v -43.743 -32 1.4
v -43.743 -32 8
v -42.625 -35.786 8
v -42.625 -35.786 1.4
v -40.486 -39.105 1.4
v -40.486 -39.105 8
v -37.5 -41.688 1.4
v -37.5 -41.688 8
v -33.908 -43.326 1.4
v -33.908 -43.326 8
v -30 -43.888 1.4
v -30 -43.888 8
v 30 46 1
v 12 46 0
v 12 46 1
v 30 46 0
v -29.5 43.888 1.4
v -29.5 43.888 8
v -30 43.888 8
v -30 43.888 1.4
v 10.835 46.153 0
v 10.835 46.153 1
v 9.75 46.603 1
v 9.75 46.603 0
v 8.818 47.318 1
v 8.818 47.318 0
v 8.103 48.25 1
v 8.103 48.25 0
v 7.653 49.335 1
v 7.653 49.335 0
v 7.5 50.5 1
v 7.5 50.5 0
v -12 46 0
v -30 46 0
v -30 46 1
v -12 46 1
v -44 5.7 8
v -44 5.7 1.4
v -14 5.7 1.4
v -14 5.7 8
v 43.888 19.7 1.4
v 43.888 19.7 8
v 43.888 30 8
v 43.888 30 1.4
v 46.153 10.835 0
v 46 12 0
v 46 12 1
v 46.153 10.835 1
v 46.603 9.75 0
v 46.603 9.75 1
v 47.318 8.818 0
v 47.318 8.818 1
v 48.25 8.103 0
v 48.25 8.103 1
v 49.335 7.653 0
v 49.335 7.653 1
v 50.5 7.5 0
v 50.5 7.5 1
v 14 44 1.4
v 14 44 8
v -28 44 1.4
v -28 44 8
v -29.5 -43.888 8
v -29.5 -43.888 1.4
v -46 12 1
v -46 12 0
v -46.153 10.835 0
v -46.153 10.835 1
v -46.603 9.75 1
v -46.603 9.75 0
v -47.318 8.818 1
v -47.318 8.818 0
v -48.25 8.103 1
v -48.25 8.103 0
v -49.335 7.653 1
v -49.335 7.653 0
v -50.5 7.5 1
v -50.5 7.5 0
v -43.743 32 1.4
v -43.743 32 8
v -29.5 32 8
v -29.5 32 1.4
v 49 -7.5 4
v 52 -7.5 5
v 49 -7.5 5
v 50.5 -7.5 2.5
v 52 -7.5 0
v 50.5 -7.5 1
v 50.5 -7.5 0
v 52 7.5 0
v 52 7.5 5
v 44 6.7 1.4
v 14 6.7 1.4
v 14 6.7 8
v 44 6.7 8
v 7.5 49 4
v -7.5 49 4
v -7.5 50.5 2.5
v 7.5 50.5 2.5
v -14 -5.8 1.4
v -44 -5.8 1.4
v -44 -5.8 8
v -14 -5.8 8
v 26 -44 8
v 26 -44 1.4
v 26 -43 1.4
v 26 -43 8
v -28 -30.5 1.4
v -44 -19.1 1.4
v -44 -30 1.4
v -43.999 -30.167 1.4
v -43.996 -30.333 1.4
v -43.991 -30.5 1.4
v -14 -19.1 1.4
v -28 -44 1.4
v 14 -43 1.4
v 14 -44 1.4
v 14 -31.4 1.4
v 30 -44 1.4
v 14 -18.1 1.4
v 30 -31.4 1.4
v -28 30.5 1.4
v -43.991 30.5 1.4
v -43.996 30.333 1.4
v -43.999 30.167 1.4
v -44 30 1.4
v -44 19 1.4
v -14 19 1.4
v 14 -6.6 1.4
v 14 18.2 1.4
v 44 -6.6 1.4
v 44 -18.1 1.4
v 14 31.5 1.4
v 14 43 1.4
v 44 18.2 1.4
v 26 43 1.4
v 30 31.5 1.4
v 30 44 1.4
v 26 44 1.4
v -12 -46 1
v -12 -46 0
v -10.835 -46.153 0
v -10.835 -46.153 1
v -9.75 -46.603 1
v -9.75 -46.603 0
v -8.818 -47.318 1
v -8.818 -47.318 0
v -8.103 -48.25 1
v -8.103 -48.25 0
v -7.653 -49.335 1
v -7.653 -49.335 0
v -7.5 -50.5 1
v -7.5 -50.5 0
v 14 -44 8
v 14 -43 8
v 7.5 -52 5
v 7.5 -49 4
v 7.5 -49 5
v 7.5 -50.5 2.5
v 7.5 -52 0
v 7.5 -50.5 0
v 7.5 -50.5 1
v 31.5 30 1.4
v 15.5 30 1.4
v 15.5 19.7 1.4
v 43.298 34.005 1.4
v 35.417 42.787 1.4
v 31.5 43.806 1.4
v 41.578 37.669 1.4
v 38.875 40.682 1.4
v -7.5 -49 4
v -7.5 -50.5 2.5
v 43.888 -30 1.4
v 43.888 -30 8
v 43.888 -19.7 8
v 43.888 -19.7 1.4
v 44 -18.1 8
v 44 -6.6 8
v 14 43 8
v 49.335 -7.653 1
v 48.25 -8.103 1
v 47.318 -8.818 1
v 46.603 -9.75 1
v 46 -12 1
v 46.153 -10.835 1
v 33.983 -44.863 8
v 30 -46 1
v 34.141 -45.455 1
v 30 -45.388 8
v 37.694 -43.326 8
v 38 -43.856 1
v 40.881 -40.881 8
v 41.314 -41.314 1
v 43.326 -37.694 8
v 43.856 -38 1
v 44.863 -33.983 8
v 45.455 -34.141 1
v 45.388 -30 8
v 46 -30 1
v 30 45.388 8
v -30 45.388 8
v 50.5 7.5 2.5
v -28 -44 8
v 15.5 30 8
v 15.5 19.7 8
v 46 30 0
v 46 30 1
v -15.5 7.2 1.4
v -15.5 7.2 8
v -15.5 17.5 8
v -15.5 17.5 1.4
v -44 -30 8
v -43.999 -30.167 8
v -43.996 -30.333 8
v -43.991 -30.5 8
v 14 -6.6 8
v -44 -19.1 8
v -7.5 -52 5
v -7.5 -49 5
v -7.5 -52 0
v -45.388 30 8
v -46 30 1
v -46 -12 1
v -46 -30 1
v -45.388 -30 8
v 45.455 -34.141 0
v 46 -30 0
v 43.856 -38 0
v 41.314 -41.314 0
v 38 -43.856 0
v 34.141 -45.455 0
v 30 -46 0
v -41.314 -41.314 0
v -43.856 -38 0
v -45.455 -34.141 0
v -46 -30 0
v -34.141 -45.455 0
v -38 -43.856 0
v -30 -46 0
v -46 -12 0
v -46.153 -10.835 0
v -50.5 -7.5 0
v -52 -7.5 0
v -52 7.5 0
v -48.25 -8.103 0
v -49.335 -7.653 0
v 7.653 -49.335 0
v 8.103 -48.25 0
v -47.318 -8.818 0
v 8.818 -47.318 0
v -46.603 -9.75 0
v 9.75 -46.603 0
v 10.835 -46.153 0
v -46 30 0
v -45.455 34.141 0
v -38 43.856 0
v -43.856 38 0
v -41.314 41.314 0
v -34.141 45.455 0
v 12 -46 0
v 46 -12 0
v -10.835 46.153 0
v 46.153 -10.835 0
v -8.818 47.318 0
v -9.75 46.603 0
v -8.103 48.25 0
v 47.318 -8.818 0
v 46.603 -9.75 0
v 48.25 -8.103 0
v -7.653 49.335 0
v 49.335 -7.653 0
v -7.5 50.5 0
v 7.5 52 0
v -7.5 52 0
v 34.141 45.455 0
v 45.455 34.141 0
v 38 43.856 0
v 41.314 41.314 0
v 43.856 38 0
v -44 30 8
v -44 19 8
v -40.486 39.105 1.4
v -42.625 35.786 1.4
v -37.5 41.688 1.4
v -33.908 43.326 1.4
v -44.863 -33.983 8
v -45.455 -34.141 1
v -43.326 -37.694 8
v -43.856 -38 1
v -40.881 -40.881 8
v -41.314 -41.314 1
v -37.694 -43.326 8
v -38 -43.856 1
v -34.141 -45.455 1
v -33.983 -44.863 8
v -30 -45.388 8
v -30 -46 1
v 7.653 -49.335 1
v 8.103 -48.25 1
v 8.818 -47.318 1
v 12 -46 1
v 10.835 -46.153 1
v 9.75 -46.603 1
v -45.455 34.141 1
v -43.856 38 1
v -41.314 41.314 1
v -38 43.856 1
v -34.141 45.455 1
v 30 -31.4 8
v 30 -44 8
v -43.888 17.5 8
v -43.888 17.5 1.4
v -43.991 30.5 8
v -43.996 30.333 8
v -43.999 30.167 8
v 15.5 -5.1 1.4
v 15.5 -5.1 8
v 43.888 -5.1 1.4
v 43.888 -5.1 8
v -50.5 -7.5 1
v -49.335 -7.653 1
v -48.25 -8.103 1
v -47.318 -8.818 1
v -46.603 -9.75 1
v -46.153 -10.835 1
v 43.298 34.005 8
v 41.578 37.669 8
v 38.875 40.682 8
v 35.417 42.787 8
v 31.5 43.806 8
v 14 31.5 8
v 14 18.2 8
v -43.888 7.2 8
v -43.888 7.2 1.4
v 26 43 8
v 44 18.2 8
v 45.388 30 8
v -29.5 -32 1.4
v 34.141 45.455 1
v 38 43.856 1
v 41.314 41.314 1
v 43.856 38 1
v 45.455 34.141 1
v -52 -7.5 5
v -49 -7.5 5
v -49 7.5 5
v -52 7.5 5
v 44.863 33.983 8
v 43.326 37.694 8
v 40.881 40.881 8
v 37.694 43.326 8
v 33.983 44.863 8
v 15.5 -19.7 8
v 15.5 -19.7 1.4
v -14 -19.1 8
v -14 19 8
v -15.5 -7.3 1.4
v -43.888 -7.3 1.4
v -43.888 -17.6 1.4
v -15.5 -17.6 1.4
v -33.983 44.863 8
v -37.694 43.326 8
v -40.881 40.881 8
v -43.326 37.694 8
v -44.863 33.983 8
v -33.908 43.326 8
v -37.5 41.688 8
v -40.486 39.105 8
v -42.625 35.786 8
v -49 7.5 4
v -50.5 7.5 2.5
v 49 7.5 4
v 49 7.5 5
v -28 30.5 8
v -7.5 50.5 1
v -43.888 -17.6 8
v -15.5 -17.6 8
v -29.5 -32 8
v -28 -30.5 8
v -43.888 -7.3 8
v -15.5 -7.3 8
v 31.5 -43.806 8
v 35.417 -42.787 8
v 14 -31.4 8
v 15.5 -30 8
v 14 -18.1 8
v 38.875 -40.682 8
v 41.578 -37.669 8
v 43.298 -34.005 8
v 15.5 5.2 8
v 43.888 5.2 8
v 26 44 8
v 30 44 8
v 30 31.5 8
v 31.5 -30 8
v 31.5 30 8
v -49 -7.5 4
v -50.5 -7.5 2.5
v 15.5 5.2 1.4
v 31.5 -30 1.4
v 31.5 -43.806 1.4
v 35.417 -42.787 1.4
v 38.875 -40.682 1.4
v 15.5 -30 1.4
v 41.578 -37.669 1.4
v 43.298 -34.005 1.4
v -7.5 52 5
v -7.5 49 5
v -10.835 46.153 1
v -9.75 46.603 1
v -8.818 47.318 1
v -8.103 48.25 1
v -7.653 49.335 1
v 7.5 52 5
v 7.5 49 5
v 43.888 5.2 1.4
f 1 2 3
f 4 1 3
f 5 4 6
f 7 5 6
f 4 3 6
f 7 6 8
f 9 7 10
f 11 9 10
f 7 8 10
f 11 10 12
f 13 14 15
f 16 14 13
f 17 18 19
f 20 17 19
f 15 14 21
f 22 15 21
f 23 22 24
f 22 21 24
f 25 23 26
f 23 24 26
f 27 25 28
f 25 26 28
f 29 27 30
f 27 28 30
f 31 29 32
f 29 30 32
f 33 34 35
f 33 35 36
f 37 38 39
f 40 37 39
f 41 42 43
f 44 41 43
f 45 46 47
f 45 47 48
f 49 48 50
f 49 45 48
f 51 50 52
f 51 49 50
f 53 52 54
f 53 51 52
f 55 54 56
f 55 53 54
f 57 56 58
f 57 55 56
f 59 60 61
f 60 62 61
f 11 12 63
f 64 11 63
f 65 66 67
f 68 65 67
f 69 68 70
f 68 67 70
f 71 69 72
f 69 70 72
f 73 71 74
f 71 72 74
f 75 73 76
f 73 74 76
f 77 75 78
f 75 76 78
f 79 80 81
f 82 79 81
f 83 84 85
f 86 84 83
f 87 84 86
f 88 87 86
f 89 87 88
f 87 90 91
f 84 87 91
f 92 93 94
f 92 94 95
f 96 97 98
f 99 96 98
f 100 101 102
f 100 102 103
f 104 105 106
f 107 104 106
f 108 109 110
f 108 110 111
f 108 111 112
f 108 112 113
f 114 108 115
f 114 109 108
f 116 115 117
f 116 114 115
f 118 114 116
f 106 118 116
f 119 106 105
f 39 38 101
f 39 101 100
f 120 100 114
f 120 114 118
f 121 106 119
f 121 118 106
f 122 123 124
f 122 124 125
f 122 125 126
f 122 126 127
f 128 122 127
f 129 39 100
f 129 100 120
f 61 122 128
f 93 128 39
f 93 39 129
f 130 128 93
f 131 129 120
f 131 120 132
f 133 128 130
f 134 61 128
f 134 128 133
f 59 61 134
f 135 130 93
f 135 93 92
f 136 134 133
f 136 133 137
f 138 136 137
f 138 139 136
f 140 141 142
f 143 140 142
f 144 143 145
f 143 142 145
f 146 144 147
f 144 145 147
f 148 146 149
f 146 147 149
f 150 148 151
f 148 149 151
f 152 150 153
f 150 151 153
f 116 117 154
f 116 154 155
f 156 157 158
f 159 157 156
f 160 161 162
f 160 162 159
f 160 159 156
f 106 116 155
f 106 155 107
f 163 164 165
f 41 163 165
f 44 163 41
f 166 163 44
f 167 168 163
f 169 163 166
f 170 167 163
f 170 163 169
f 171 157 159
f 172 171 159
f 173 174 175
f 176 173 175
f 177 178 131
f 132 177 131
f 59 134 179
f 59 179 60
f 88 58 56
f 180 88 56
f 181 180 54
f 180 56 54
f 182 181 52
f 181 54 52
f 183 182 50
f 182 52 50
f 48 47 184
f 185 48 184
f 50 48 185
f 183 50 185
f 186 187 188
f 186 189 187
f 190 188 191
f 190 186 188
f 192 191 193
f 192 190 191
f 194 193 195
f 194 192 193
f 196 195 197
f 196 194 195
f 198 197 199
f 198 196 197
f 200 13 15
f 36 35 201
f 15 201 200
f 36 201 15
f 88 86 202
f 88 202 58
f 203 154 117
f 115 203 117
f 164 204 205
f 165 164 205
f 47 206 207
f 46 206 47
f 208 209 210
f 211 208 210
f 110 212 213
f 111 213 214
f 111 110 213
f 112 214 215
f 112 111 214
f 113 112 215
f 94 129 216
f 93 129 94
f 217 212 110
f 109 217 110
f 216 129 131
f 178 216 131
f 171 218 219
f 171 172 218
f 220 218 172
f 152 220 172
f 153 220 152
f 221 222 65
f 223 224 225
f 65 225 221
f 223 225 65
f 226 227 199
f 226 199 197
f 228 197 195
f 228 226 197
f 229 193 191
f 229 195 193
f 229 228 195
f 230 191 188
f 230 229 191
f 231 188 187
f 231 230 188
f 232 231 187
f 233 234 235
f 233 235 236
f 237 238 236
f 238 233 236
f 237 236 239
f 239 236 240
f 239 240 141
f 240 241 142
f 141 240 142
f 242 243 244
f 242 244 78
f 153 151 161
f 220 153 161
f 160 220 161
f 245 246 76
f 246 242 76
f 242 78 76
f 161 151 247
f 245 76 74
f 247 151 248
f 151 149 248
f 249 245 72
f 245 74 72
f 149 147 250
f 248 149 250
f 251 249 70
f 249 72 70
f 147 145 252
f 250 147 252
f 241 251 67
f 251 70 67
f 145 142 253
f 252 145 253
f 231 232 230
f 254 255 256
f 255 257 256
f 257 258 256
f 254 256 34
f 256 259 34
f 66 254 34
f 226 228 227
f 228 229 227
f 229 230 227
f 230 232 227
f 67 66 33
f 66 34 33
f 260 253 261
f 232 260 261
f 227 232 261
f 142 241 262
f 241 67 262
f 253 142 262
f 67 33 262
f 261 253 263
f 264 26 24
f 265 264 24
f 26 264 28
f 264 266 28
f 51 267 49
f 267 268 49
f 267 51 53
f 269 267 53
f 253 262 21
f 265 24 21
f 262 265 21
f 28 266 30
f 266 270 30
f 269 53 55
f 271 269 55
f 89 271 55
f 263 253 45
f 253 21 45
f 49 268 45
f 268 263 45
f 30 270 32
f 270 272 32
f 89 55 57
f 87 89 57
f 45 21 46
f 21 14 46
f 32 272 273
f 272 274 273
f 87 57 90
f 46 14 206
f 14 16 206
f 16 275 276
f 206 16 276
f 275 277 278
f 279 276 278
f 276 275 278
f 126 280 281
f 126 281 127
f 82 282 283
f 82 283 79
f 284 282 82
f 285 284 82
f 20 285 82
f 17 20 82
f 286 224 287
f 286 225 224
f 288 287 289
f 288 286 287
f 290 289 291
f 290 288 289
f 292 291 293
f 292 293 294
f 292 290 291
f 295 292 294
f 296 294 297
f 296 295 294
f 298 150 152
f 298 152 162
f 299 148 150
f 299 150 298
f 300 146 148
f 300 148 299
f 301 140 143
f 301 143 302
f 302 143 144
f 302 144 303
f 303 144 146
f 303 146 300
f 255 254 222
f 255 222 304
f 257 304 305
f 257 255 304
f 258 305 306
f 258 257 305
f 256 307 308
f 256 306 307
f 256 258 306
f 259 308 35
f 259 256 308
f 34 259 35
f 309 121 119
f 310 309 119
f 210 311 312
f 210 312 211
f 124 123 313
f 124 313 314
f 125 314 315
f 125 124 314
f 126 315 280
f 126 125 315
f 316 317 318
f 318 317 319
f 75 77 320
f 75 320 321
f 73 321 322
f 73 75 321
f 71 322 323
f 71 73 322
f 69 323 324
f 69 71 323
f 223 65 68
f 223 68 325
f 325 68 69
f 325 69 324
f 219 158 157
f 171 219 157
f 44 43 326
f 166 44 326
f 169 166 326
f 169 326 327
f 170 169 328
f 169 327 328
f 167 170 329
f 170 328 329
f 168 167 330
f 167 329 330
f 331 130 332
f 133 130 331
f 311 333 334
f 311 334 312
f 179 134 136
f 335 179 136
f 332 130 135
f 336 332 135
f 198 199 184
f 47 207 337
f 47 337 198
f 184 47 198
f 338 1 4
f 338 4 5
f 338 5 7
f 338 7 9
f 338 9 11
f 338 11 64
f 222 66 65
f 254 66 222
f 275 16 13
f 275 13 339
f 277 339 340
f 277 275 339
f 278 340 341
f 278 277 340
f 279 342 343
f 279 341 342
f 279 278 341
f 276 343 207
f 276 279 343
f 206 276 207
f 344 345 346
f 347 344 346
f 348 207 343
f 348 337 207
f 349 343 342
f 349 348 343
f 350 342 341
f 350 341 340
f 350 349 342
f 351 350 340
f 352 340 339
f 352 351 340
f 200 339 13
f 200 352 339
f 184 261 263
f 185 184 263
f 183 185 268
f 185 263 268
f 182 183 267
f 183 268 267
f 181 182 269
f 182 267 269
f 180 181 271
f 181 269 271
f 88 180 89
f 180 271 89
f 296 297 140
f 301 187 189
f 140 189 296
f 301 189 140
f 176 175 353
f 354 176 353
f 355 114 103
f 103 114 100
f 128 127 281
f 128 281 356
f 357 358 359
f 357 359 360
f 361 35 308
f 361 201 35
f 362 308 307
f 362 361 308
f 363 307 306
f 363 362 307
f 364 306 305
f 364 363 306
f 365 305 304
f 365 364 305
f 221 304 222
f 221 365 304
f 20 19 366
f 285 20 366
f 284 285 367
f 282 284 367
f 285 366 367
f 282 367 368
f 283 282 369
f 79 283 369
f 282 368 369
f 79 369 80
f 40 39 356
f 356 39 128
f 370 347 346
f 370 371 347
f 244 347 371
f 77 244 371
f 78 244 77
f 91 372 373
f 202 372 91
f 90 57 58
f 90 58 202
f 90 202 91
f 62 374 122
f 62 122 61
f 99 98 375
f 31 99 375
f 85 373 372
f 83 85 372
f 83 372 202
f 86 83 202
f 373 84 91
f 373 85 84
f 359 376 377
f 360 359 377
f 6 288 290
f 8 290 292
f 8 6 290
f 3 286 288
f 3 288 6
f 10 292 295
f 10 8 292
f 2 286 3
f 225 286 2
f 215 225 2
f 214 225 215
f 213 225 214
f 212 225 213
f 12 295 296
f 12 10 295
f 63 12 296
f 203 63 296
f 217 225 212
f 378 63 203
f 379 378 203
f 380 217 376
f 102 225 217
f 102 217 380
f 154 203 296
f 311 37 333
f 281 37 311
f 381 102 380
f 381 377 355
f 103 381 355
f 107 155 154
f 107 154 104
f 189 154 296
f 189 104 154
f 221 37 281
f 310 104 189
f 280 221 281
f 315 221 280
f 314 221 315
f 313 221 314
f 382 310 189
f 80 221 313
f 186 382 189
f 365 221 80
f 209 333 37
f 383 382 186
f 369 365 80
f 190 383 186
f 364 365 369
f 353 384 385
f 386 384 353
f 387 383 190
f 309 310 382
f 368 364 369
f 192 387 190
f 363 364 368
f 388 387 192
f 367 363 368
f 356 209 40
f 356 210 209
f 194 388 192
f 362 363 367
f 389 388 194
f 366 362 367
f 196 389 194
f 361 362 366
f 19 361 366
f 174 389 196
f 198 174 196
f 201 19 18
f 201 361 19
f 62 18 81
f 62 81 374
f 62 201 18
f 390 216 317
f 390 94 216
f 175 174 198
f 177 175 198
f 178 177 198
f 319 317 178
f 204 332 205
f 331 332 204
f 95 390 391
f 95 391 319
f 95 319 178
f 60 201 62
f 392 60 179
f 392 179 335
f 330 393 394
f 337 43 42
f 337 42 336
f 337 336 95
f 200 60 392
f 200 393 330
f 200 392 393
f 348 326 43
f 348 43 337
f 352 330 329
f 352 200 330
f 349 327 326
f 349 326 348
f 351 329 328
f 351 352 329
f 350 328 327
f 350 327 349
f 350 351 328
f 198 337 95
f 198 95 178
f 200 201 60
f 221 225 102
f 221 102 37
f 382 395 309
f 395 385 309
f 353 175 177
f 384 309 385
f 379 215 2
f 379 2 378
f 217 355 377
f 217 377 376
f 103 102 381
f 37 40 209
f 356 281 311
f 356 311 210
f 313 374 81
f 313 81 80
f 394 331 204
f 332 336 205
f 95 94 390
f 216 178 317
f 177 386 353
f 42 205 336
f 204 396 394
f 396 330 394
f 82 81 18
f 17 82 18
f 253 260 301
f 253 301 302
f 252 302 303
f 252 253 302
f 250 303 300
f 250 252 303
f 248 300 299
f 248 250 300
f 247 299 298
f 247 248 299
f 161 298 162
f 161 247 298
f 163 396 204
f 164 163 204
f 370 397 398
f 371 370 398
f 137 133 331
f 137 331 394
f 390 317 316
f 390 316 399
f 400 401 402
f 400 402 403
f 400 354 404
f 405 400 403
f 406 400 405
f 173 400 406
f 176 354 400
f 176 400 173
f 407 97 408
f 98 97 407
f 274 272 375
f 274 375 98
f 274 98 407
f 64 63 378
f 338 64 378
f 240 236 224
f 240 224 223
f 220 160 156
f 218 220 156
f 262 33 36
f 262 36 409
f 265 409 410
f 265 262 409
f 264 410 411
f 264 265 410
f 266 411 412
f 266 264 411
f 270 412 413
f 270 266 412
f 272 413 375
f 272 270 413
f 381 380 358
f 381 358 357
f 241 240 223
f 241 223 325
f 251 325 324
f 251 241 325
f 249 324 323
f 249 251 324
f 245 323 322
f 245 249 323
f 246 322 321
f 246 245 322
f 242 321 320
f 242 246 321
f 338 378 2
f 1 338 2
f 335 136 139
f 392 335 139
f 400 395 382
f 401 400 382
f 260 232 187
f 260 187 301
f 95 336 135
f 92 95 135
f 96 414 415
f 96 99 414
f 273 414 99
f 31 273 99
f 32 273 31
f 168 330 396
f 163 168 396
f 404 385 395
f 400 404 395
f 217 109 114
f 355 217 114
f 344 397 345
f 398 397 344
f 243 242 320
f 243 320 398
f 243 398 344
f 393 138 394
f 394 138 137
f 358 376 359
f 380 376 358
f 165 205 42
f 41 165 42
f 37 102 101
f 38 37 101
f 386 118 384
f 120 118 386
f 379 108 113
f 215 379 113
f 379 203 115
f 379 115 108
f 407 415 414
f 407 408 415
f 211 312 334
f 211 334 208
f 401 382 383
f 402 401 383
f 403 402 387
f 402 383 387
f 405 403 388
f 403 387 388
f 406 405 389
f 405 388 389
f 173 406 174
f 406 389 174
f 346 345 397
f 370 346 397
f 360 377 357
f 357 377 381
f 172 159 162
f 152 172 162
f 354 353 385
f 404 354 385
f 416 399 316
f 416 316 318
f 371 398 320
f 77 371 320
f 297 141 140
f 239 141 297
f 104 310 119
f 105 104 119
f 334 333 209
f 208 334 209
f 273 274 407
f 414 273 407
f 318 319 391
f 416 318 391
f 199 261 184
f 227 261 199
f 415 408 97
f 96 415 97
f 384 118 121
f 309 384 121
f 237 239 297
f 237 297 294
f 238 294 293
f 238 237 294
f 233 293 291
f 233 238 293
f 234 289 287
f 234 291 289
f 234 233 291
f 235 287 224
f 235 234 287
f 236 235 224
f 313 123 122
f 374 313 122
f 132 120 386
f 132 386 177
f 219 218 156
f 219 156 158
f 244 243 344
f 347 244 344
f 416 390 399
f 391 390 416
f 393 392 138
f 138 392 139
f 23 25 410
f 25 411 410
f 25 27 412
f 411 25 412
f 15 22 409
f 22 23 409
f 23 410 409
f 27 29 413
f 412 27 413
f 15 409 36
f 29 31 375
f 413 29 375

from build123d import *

# Parameters (mm, degrees)
F4_DEPTH     = 1.4
F5_W         = 30
F5_H         = 13.3
F5_W_2       = 12
F5_H_2       = 1
F6_DEPTH     = 6.6
F8_DEPTH     = 6.6
F9_W         = 14
F9_H         = 13.5
F10_DEPTH    = 6.6
F11_W        = 28.3875793553
F11_H        = 10.3
F12_DEPTH    = 6.6
F14_DEPTH    = 5.001
F15_T1_DEPTH = 1


# Not quite as in the source:
# - a fillet or chamfer that OpenCascade refuses, or shapes differently, is made with other operations: its cross-section is extruded or revolved along the edge and cut away or added


with BuildPart() as f2:
    # F2: sweep along a path in F0
    with BuildLine(Plane.XY) as f2_path:
        ThreePointArc((52, 30), (45.5563491861, 45.5563491861), (30, 52))
        Line((30, 52), (0, 52))
        Line((0, 52), (-30, 52))
        ThreePointArc((-30, 52), (-45.5563491861, 45.5563491861), (-52, 30))
        Line((-52, 30), (-52, 0))
        Line((-52, 0), (-52, -30))
        ThreePointArc((-52, -30), (-45.5563491861, -45.5563491861), (-30, -52))
        Line((-30, -52), (0, -52))
        Line((0, -52), (30, -52))
        ThreePointArc((30, -52), (45.5563491861, -45.5563491861), (52, -30))
        Line((52, -30), (52, 0))
        Line((52, 0), (52, 30))
    # F1 (on Front) → F2 (sweep)
    with BuildSketch(Plane.XZ):
        Polygon((44, 8), (44, 0), (52, 0), (52, 1), (52, 5), (49, 5), (49, 4), (50.5, 2.5), (50.5, 1), (46, 1), (45.3875793553, 8), align=None)
    sweep(path=f2_path.line)

    # F3 (on Top) → F4 (join)
    with BuildSketch(Plane.XY):
        with BuildLine():
            ThreePointArc((-44, -30), (-39.8994949366, -39.8994949366), (-30, -44))
            Line((-30, -44), (30, -44))
            ThreePointArc((30, -44), (39.8994949366, -39.8994949366), (44, -30))
            Line((44, -30), (44, 30))
            ThreePointArc((44, 30), (39.8994949366, 39.8994949366), (30, 44))
            Line((30, 44), (-30, 44))
            ThreePointArc((-30, 44), (-39.8994949366, 39.8994949366), (-44, 30))
            Line((-44, 30), (-44, -30))
        make_face()
    extrude(amount=F4_DEPTH)

    # F5 (on face) → F6 (join, through all)
    with BuildSketch(Plane.XY.offset(1.4)):
        with Locations((29, 24.85)):
            Rectangle(F5_W, F5_H)
        with Locations((20, 43.5)):
            Rectangle(F5_W_2, F5_H_2)
        with Locations((29, 0.05)):
            Rectangle(F5_W, F5_H)
        with Locations((29, -24.75)):
            Rectangle(F5_W, F5_H)
        with Locations((20, -43.5)):
            Rectangle(F5_W_2, F5_H_2)
        with BuildLine():
            ThreePointArc((-30, 44), (-39.7211110476, 40.0747208398), (-43.9910685796, 30.5))
            Line((-43.9910685796, 30.5), (-14, 30.5))
            Line((-14, 30.5), (-14, 44))
            Line((-14, 44), (-30, 44))
        make_face()
        with BuildLine():
            Line((-43.9910685796, 30.5), (-44, 30.5))
            Line((-44, 30.5), (-44, 30))
            ThreePointArc((-44, 30), (-43.9977669668, 30.250039882), (-43.9910685796, 30.5))
        make_face()
        with BuildLine():
            Line((-44, -30.5), (-43.9910685796, -30.5))
            ThreePointArc((-43.9910685796, -30.5), (-43.9977669668, -30.250039882), (-44, -30))
            Line((-44, -30), (-44, -30.5))
        make_face()
        with BuildLine():
            Line((-30, -44), (-14, -44))
            Line((-14, -44), (-14, -30.5))
            Line((-14, -30.5), (-43.9910685796, -30.5))
            ThreePointArc((-43.9910685796, -30.5), (-39.7211110476, -40.0747208398), (-30, -44))
        make_face()
        with Locations((-29, 12.35)):
            Rectangle(F5_W, F5_H)
        with Locations((-29, -12.45)):
            Rectangle(F5_W, F5_H)
    extrude(amount=F6_DEPTH)

    # F7 (on face) → F8 (join, through all)
    with BuildSketch(Plane.XY.offset(1.4)):
        with BuildLine():
            Line((43.9298241195, -31.4), (30, -31.4))
            Line((30, -31.4), (30, -44))
            ThreePointArc((30, -44), (39.3914855055, -40.3826778819), (43.9298241195, -31.4))
        make_face()
        with BuildLine():
            ThreePointArc((43.9194109071, 31.5), (39.3541434669, 40.416333328), (30, 44))
            Line((30, 44), (30, 31.5))
            Line((30, 31.5), (43.9194109071, 31.5))
        make_face()
    extrude(amount=F8_DEPTH)

    # F9 (on face) → F10 (cut, through all)
    with BuildSketch(Plane.XY.offset(8)):
        with Locations((-21, 37.25)):
            Rectangle(F9_W, F9_H)
        with Locations((-21, -37.25)):
            Rectangle(F9_W, F9_H)
    extrude(amount=-F10_DEPTH, mode=Mode.SUBTRACT)

    # F11 (on face) → F12 (cut, through all)
    with BuildSketch(Plane.XY.offset(8)):
        with BuildLine():
            Line((-43.7428112244, 32), (-29.5, 32))
            Line((-29.5, 32), (-29.5, 43.8875793553))
            Line((-29.5, 43.8875793553), (-30, 43.8875793553))
            ThreePointArc((-30, 43.8875793553), (-39.0854196832, 40.5033332581), (-43.7428112244, 32))
        make_face()
        with BuildLine():
            Line((15.5, 19.6999999465), (43.8875793553, 19.6999999465))
            Line((43.8875793553, 19.6999999465), (43.8875793553, 29.9999999465))
            ThreePointArc((43.8875793553, 30), (40.3367361721, 39.274521317), (31.5, 43.8063340663))
            Line((31.5, 43.8063340663), (31.5, 29.9999999465))
            Line((31.5, 29.9999999465), (15.5, 29.9999999465))
            Line((15.5, 29.9999999465), (15.5, 19.6999999465))
        make_face()
        with Locations((29.6937896777, 0.05)):
            Rectangle(F11_W, F11_H)
        with BuildLine():
            Line((31.5, -29.9999999465), (31.5, -43.8063340663))
            ThreePointArc((31.5, -43.8063340663), (40.3367361721, -39.274521317), (43.8875793553, -30))
            Line((43.8875793553, -29.9999999465), (43.8875793553, -29.9))
            Line((43.8875793553, -29.9), (43.8875793553, -19.6999999465))
            Line((43.8875793553, -19.6999999465), (15.5, -19.6999999465))
            Line((15.5, -19.6999999465), (15.5, -29.9))
            Line((15.5, -29.9), (15.5, -29.9999999465))
            Line((15.5, -29.9999999465), (31.5, -29.9999999465))
        make_face()
        with Locations((-29.6937896777, 12.35)):
            Rectangle(F11_W, F11_H)
        with Locations((-29.6937896777, -12.45)):
            Rectangle(F11_W, F11_H)
        with BuildLine():
            Line((-29.5, -32), (-43.7428112244, -32))
            ThreePointArc((-43.7428112244, -32), (-39.0854196832, -40.5033332581), (-30, -43.8875793553))
            Line((-30, -43.8875793553), (-29.5, -43.8875793553))
            Line((-29.5, -43.8875793553), (-29.5, -32))
        make_face()
    extrude(amount=-F12_DEPTH, mode=Mode.SUBTRACT)

    # F13 (on Top) → F14 (cut, through all)
    with BuildSketch(Plane.XY):
        with BuildLine():
            Line((52, -30), (52, -7.5))
            Line((52, -7.5), (46, -7.5))
            Line((46, -7.5), (46, -30))
            ThreePointArc((46, -30), (41.313708499, -41.313708499), (30, -46))
            Line((30, -46), (7.5, -46))
            Line((7.5, -46), (7.5, -52))
            Line((7.5, -52), (30, -52))
            ThreePointArc((30, -52), (45.5563491861, -45.5563491861), (52, -30))
        make_face()
        with BuildLine():
            Line((-30, -52), (-7.5, -52))
            Line((-7.5, -52), (-7.5, -46))
            Line((-7.5, -46), (-30, -46))
            ThreePointArc((-30, -46), (-41.313708499, -41.313708499), (-46, -30))
            Line((-46, -30), (-46, -7.5))
            Line((-46, -7.5), (-52, -7.5))
            Line((-52, -7.5), (-52, -30))
            ThreePointArc((-52, -30), (-45.5563491861, -45.5563491861), (-30, -52))
        make_face()
        with BuildLine():
            Line((-7.5, 46), (-7.5, 52))
            Line((-7.5, 52), (-30, 52))
            ThreePointArc((-30, 52), (-45.5563491861, 45.5563491861), (-52, 30))
            Line((-52, 30), (-52, 7.5))
            Line((-52, 7.5), (-46, 7.5))
            Line((-46, 7.5), (-46, 30))
            ThreePointArc((-46, 30), (-41.313708499, 41.313708499), (-30, 46))
            Line((-30, 46), (-7.5, 46))
        make_face()
        with BuildLine():
            ThreePointArc((30, 46), (41.313708499, 41.313708499), (46, 30))
            Line((46, 30), (46, 7.5))
            Line((46, 7.5), (52, 7.5))
            Line((52, 7.5), (52, 30))
            ThreePointArc((52, 30), (45.5563491861, 45.5563491861), (30, 52))
            Line((30, 52), (7.5, 52))
            Line((7.5, 52), (7.5, 46))
            Line((7.5, 46), (30, 46))
        make_face()
    extrude(amount=F14_DEPTH, mode=Mode.SUBTRACT)

    # F15: fillet of radius 4.5 on 8 edges, made by hand

    # F15_s2 → F15_t1 (join)
    with BuildSketch(Plane.XY):
        with BuildLine():
            ThreePointArc((-46, 12), (-47.3180194847, 8.8180194847), (-50.5, 7.5))
            Line((-50.5, 7.5), (-46, 7.5))
            Line((-46, 7.5), (-46, 12))
        make_face()
        with BuildLine():
            ThreePointArc((-12, 46), (-8.8180194847, 47.3180194847), (-7.5, 50.5))
            Line((-7.5, 50.5), (-7.5, 46))
            Line((-7.5, 46), (-12, 46))
        make_face()
        with BuildLine():
            ThreePointArc((12, 46), (8.8180194847, 47.3180194847), (7.5, 50.5))
            Line((7.5, 50.5), (7.5, 46))
            Line((7.5, 46), (12, 46))
        make_face()
        with BuildLine():
            ThreePointArc((12, -46), (8.8180194847, -47.3180194847), (7.5, -50.5))
            Line((7.5, -50.5), (7.5, -46))
            Line((7.5, -46), (12, -46))
        make_face()
        with BuildLine():
            ThreePointArc((-12, -46), (-8.8180194847, -47.3180194847), (-7.5, -50.5))
            Line((-7.5, -50.5), (-7.5, -46))
            Line((-7.5, -46), (-12, -46))
        make_face()
        with BuildLine():
            ThreePointArc((-46, -12), (-47.3180194847, -8.8180194847), (-50.5, -7.5))
            Line((-50.5, -7.5), (-46, -7.5))
            Line((-46, -7.5), (-46, -12))
        make_face()
        with BuildLine():
            ThreePointArc((46, -12), (47.3180194847, -8.8180194847), (50.5, -7.5))
            Line((50.5, -7.5), (46, -7.5))
            Line((46, -7.5), (46, -12))
        make_face()
        with BuildLine():
            ThreePointArc((46, 12), (47.3180194847, 8.8180194847), (50.5, 7.5))
            Line((50.5, 7.5), (46, 7.5))
            Line((46, 7.5), (46, 12))
        make_face()
    extrude(amount=F15_T1_DEPTH)


solid = f2.part
